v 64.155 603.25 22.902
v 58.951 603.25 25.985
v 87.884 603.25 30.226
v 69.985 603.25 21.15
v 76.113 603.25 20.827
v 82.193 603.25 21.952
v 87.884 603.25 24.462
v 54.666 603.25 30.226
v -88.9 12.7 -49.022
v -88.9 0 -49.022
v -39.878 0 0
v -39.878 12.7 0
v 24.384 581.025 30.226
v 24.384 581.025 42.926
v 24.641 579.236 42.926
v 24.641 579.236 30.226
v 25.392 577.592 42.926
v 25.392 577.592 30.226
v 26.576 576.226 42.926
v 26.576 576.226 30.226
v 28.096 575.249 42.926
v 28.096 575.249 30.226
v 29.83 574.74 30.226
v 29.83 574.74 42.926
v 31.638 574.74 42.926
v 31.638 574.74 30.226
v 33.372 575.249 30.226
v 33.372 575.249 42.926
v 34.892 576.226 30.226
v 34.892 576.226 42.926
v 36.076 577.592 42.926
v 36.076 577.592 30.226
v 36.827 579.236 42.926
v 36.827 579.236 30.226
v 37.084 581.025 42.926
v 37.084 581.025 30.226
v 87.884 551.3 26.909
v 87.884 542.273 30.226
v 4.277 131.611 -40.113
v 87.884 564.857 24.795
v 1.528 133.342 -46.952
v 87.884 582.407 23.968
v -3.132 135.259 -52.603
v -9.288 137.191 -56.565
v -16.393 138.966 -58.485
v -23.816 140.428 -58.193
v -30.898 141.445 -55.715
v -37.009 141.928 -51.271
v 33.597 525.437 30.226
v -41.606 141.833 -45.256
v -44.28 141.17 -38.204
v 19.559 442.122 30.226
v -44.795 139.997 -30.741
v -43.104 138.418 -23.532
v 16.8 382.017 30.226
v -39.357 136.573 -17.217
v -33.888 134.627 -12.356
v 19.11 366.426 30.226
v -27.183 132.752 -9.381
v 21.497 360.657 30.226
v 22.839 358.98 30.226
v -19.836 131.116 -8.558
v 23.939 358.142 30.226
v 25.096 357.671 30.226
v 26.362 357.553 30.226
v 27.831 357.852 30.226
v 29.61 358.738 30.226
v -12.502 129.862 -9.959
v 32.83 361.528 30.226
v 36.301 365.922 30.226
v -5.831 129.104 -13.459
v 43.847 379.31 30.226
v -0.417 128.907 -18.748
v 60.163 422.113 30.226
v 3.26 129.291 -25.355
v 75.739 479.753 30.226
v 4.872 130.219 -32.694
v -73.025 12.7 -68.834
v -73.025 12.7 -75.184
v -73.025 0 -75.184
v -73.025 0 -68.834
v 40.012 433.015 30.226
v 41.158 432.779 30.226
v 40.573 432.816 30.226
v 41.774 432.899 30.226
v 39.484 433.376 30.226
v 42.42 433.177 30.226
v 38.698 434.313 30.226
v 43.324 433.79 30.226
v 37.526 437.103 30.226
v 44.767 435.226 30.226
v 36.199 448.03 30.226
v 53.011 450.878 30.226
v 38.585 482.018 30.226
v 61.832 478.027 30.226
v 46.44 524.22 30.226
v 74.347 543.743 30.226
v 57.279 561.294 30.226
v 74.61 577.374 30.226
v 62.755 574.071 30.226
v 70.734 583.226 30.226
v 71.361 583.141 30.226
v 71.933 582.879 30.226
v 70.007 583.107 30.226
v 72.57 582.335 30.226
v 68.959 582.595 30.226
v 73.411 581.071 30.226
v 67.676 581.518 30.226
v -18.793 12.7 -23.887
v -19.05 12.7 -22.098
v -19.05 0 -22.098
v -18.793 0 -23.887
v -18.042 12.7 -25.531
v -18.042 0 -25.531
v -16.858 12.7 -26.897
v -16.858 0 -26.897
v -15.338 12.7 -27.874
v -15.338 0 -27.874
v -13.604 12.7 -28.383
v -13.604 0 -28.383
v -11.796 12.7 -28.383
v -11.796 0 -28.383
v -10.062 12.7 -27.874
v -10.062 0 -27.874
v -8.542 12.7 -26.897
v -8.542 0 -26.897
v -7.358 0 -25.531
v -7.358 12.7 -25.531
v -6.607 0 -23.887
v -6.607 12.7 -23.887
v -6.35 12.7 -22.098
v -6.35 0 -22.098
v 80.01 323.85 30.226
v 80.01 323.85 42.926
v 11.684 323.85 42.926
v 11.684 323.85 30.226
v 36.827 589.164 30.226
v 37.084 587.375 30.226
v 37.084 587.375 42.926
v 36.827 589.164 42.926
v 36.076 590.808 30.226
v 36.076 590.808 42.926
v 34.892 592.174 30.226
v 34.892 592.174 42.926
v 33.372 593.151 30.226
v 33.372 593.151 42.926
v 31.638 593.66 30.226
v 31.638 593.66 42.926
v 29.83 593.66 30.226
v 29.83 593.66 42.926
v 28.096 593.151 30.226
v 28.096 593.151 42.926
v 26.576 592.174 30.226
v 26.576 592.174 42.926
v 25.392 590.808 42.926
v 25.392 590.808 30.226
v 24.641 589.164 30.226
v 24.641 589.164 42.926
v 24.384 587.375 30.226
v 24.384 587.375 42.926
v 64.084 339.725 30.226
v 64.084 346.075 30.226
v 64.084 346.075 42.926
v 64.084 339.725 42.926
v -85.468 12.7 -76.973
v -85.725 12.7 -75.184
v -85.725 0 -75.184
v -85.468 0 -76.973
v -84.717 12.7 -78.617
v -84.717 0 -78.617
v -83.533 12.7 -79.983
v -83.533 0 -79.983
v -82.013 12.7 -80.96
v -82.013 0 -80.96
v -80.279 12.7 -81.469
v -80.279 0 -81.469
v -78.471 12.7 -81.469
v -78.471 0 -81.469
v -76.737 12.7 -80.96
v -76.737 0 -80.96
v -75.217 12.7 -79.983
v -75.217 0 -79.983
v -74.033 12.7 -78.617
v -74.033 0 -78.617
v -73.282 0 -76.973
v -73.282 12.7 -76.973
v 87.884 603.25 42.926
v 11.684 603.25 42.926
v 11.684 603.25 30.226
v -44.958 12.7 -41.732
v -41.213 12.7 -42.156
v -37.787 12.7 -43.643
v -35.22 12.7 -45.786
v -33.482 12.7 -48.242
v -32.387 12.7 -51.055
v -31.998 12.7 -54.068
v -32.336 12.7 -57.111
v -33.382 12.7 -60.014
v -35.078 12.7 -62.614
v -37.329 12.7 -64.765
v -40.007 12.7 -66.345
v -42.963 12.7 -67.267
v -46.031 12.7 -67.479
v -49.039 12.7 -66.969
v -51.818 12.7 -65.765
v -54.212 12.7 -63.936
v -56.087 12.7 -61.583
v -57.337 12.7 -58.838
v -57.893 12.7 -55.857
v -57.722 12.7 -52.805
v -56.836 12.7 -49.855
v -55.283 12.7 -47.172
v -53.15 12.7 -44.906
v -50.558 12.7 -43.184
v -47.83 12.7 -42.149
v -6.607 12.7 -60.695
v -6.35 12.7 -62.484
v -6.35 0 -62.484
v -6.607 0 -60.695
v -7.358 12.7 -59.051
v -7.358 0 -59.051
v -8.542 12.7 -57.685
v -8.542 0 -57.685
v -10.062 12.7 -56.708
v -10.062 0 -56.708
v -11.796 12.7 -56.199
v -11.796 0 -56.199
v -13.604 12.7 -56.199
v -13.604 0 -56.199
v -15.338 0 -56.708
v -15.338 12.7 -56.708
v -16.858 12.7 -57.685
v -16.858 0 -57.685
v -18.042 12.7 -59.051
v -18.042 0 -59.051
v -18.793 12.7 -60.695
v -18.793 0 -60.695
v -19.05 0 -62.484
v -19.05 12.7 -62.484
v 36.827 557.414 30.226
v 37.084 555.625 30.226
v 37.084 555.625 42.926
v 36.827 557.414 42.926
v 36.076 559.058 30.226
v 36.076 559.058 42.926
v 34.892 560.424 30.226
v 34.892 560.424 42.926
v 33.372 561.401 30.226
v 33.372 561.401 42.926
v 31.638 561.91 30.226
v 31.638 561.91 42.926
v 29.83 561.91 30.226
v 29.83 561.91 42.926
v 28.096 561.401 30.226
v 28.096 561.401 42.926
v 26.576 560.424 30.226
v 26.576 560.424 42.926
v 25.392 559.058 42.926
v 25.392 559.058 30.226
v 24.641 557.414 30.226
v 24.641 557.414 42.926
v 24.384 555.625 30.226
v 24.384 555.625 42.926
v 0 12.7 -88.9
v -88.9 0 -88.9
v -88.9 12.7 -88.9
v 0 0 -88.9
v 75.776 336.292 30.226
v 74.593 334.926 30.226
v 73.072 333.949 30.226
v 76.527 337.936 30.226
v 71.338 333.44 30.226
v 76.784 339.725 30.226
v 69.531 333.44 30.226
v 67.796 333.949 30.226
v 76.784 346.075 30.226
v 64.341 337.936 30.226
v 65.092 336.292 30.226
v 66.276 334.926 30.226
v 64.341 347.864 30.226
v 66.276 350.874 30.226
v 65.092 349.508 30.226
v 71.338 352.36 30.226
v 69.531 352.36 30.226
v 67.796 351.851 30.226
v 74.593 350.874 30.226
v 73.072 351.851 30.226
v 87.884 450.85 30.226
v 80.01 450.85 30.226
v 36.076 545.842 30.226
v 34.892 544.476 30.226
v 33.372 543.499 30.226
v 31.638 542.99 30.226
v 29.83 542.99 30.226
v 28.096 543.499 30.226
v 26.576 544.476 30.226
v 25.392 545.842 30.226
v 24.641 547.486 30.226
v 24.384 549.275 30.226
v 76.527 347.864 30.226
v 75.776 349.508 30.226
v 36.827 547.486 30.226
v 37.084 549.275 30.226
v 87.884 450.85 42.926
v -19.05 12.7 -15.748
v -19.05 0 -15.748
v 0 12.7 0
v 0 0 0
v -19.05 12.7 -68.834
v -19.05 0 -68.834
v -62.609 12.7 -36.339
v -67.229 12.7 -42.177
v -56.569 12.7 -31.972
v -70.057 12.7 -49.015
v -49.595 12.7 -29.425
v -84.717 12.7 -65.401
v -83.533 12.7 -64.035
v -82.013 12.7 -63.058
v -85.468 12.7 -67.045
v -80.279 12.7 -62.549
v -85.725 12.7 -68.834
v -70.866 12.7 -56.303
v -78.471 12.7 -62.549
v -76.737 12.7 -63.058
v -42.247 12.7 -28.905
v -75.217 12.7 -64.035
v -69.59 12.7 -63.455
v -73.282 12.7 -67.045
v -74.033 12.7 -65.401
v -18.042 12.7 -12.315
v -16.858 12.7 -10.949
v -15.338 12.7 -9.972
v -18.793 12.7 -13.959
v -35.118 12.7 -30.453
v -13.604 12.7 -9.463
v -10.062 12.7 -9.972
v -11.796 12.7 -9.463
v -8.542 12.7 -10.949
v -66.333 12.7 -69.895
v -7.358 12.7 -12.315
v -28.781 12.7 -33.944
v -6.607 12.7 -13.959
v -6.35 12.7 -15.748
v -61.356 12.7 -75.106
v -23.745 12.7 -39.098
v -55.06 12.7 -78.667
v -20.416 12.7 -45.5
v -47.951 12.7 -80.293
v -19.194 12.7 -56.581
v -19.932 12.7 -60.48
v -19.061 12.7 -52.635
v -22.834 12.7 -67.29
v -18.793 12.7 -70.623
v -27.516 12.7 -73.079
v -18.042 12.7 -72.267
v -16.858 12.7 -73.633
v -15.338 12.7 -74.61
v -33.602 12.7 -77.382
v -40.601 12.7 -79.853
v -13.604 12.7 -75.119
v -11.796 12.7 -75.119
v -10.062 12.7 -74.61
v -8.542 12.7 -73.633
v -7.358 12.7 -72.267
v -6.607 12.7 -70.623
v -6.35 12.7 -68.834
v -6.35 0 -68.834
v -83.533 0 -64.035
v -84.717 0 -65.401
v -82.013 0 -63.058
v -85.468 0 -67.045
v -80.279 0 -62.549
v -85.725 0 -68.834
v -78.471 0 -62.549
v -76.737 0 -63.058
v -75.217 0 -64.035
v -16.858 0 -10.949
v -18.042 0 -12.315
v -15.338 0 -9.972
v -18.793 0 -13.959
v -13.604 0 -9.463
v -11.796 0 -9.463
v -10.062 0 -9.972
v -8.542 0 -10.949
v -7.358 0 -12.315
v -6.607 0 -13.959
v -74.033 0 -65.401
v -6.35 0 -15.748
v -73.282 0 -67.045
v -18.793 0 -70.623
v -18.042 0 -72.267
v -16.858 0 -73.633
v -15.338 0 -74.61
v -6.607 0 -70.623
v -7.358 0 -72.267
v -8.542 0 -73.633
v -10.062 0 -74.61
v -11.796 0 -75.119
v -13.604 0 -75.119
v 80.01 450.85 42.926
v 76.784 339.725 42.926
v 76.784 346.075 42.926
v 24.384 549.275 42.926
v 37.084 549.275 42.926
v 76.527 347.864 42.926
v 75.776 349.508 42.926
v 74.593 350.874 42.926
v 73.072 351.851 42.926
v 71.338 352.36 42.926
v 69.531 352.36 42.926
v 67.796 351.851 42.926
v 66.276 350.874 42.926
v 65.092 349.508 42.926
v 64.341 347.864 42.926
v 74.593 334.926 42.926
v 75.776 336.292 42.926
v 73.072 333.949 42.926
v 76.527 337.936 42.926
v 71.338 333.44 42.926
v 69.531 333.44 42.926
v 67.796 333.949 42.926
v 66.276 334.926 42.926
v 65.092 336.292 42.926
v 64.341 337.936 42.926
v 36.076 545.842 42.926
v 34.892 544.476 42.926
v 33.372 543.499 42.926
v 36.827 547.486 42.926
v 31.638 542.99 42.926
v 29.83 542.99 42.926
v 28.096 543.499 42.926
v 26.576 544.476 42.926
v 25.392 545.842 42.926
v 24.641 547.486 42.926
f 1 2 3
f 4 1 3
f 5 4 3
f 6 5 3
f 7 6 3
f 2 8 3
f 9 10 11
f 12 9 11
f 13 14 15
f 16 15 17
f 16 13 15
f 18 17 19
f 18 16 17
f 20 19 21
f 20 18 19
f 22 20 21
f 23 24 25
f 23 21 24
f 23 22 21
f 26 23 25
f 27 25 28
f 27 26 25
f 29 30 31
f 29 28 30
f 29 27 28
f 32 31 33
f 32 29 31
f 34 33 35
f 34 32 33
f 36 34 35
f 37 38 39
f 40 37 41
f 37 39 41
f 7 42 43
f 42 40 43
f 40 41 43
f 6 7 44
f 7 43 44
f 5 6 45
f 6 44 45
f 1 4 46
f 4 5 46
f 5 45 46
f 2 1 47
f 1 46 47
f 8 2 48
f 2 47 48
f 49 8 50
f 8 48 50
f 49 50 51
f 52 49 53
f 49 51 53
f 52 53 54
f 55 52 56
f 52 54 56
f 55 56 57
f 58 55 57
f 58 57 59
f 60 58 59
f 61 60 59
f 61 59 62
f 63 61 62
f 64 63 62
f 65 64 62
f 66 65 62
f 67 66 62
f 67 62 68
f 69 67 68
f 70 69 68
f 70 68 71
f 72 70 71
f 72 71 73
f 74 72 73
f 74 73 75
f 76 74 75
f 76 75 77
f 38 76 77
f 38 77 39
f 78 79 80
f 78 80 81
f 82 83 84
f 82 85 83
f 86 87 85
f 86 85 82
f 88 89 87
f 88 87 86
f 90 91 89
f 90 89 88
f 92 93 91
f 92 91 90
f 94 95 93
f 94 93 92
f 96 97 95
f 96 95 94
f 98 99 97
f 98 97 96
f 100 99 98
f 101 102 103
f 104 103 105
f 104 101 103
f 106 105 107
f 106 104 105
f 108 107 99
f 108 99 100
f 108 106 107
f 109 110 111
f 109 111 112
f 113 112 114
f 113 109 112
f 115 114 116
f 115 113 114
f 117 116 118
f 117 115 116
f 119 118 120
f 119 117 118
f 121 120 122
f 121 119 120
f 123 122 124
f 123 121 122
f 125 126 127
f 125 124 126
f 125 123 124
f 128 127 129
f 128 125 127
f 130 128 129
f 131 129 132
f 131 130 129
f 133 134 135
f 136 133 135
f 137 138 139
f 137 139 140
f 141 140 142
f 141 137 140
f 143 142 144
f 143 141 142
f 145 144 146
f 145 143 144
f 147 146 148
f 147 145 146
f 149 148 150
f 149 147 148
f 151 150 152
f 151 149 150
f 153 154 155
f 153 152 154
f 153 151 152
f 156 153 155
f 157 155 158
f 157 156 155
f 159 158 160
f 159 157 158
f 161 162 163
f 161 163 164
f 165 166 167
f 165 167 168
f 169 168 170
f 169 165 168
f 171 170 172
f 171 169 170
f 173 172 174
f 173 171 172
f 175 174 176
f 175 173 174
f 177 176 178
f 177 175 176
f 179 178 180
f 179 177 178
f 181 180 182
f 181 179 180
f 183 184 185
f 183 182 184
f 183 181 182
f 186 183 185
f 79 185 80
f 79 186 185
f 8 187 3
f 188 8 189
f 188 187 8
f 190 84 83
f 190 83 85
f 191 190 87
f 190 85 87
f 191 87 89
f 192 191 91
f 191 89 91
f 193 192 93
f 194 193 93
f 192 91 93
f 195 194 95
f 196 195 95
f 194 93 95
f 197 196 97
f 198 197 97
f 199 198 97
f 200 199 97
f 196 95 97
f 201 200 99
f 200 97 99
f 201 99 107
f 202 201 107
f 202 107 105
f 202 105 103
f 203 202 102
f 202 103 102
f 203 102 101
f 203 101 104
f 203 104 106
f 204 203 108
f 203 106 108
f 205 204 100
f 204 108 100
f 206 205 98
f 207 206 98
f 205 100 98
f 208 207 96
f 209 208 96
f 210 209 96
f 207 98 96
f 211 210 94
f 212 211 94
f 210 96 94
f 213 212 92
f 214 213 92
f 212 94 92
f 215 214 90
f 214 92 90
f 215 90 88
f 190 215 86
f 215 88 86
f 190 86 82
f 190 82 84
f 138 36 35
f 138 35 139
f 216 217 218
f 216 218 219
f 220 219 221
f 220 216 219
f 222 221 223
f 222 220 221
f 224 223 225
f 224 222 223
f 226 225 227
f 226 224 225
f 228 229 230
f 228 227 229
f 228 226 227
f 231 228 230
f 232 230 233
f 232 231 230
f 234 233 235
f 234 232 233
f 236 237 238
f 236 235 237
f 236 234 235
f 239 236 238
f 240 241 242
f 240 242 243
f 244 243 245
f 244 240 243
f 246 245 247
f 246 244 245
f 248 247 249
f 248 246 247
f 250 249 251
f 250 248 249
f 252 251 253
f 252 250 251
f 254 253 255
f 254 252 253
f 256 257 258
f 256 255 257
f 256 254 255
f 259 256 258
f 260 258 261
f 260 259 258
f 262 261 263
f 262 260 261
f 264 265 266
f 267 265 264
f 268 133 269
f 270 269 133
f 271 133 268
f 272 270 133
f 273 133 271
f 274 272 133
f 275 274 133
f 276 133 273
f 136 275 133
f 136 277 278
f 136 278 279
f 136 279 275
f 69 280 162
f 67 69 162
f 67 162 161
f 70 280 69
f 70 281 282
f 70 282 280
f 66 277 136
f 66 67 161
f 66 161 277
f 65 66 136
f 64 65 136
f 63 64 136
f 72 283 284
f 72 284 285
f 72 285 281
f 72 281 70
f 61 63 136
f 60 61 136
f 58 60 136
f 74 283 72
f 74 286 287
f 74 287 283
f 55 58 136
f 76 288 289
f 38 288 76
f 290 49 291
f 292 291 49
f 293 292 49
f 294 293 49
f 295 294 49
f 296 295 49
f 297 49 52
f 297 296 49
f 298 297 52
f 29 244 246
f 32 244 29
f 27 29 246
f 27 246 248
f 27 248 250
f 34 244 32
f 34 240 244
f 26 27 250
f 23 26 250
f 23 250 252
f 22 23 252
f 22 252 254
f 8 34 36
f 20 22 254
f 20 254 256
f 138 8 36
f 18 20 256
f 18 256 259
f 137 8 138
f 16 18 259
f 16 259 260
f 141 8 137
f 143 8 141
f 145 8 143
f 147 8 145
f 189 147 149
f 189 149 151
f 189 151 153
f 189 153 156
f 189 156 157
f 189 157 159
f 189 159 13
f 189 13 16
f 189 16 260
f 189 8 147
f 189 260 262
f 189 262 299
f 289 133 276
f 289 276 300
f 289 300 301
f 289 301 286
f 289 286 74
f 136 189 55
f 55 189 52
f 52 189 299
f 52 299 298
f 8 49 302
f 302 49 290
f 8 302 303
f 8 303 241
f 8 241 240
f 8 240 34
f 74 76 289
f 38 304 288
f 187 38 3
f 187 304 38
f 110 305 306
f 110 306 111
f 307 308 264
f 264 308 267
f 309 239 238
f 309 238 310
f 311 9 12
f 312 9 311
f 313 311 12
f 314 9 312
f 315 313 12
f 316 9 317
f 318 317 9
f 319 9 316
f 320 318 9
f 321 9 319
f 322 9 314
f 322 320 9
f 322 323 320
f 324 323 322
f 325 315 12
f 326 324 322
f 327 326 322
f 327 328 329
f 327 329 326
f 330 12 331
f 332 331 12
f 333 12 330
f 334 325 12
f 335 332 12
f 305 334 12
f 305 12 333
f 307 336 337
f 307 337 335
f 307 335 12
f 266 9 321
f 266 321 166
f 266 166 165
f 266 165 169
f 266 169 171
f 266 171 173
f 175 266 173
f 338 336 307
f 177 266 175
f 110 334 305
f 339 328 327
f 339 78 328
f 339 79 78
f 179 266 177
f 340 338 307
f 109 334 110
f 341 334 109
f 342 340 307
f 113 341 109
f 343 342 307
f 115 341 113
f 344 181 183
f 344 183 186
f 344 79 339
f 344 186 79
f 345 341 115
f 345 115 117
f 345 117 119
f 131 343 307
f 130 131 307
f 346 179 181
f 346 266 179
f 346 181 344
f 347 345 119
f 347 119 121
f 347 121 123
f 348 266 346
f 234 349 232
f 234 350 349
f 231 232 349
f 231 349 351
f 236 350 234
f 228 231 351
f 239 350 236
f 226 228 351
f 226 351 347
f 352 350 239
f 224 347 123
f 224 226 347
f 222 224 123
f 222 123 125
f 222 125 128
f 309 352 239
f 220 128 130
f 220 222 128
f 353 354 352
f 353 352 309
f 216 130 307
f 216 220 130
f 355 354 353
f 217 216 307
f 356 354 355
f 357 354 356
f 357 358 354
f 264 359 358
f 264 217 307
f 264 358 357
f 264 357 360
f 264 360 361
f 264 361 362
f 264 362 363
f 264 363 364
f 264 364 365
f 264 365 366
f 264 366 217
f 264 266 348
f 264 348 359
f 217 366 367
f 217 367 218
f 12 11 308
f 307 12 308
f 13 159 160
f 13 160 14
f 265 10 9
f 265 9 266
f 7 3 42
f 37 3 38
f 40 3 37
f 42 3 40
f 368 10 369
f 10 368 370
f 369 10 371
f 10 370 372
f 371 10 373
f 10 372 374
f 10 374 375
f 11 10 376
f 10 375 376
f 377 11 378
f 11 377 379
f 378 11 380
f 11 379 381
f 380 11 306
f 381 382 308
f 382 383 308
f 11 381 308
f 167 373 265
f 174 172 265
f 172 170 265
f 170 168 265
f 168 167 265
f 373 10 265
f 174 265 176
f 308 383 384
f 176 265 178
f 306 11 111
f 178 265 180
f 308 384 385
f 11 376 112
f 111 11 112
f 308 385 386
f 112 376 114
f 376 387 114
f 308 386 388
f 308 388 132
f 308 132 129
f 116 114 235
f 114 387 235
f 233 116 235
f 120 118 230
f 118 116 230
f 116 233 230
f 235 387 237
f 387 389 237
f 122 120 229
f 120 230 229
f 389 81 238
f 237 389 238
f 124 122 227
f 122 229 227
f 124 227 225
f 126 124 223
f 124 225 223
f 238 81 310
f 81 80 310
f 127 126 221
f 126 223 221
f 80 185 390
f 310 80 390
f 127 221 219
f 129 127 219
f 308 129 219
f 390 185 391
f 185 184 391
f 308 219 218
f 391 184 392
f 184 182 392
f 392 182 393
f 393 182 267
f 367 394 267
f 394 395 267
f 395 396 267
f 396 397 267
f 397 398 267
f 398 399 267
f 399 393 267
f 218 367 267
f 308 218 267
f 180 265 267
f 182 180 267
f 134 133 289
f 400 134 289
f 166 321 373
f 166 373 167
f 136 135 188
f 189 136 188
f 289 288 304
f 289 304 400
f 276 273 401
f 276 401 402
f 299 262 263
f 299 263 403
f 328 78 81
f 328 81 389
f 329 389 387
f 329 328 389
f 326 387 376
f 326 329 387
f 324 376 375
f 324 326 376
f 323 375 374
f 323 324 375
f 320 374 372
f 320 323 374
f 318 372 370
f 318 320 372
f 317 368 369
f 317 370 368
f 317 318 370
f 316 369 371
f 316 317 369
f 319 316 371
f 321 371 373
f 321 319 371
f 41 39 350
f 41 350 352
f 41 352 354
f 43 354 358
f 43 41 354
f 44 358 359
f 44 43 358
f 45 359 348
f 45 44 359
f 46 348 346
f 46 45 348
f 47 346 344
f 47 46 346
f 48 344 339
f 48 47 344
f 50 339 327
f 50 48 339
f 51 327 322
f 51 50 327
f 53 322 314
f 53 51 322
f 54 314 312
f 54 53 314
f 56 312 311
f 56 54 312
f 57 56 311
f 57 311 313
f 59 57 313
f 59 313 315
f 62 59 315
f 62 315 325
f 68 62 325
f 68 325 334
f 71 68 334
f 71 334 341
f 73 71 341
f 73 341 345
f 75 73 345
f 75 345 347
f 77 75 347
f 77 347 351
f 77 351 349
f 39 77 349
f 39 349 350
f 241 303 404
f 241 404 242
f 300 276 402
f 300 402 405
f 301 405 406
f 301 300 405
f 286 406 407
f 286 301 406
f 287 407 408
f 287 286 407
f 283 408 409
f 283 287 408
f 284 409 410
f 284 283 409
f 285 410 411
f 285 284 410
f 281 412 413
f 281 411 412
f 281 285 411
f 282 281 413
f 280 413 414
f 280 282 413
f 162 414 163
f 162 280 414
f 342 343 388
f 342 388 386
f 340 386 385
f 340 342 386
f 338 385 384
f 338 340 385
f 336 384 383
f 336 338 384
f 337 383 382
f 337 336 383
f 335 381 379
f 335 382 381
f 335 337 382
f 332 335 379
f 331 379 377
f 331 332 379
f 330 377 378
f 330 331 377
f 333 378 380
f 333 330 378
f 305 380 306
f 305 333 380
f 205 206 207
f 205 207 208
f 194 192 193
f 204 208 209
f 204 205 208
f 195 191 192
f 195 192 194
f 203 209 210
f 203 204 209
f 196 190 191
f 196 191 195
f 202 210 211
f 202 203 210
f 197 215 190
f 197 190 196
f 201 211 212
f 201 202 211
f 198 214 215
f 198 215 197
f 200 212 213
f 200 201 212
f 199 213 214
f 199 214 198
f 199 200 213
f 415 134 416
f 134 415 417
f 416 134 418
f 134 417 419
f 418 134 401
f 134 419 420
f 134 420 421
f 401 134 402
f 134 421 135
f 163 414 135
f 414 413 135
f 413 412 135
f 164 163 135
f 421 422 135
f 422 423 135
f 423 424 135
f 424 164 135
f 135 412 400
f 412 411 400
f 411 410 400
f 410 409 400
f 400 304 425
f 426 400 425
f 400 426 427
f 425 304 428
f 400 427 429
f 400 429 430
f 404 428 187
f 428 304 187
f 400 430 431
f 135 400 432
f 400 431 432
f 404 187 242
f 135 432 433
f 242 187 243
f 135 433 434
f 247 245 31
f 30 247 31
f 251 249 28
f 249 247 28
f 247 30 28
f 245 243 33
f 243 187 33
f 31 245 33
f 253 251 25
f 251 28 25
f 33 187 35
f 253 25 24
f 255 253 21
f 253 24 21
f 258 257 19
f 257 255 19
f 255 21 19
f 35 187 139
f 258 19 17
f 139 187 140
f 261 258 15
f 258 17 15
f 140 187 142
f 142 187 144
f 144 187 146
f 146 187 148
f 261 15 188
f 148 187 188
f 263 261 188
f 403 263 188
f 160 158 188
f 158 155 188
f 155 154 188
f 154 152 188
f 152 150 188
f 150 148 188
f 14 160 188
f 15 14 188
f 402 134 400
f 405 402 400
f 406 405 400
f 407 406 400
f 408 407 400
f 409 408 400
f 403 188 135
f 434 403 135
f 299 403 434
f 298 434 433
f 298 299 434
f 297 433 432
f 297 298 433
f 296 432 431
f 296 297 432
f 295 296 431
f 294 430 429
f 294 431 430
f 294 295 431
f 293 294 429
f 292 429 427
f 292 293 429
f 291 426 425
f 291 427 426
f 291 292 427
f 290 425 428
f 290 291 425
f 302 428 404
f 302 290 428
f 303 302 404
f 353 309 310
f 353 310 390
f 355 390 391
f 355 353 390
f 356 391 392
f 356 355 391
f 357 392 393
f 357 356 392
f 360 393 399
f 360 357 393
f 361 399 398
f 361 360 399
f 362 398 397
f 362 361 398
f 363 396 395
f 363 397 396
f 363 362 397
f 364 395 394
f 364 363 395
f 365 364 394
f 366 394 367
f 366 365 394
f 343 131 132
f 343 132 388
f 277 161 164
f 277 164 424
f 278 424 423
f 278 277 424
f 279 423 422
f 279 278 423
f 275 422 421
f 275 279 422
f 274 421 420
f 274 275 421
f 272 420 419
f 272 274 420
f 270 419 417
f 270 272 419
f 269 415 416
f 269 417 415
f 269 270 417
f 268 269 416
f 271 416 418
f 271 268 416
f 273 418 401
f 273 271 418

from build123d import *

# Parameters (mm, degrees)
SKETCH1_W                  = 88.9
SKETCH1_H                  = 88.9
EXTRUDE1_DEPTH             = 12.7
EXTRUDE2_DEPTH             = 127.363404513
EXTRUDE9_DEPTH             = 127.363404513
SKETCH4_W                  = 76.2
SKETCH4_H                  = 279.4
EXTRUDE3_DEPTH             = 12.7
EXTRUDE7_DEPTH             = 622.292826593
EXTRUDE6_REACH             = 742.115
EXTRUDE6_START             = 127
SKETCH7_R                  = 25.4
SKETCH7_R_2                = 12.7
EXTRUDE6_DIRECTION_2_REACH = 742.115
EXTRUDE10_DEPTH            = 676.899389977
SKETCH9_W                  = 7.874
SKETCH9_H                  = 127
EXTRUDE8_DEPTH             = 622.292826593


with BuildPart() as part:
    # Sketch1 → Extrude1 (new body)
    with BuildSketch(Plane(origin=(0, 0, 0), x_dir=(1, 0, 0), z_dir=(0, 1, 0))):
        with Locations((-44.45, 44.45)):
            Rectangle(SKETCH1_W, SKETCH1_H)
    extrude(amount=EXTRUDE1_DEPTH)

    # Sketch2 → Extrude2 (cut, through all)
    with BuildSketch(Plane(origin=(0, 12.7, 0), x_dir=(1, 0, 0), z_dir=(0, 1, 0))):
        with BuildLine():
            Line((-19.05, 15.748), (-19.05, 22.098))
            ThreePointArc((-19.05, 22.098), (-12.7, 28.448), (-6.35, 22.098))
            Line((-6.35, 22.098), (-6.35, 15.748))
            ThreePointArc((-6.35, 15.748), (-12.7, 9.398), (-19.05, 15.748))
        make_face()
        with BuildLine():
            Line((-19.05, 62.484), (-19.05, 68.834))
            ThreePointArc((-19.05, 68.834), (-12.7, 75.184), (-6.35, 68.834))
            Line((-6.35, 68.834), (-6.35, 62.484))
            ThreePointArc((-6.35, 62.484), (-12.7, 56.134), (-19.05, 62.484))
        make_face()
        with BuildLine():
            Line((-85.725, 68.834), (-85.725, 75.184))
            ThreePointArc((-85.725, 75.184), (-79.375, 81.534), (-73.025, 75.184))
            Line((-73.025, 75.184), (-73.025, 68.834))
            ThreePointArc((-73.025, 68.834), (-79.375, 62.484), (-85.725, 68.834))
        make_face()
    extrude(amount=-EXTRUDE2_DEPTH, mode=Mode.SUBTRACT)

    # Sketch10 → Extrude9 (cut, through all)
    with BuildSketch(Plane.XZ):
        Polygon((-88.9, -49.022), (-39.878, 0), (-88.9, 0), align=None)
    extrude(amount=-EXTRUDE9_DEPTH, mode=Mode.SUBTRACT)



with BuildPart() as body_2:
    # Sketch4 → Extrude3 (new body)
    with BuildSketch(Plane(origin=(0, 0, 42.926), x_dir=(-1, 0, 0), z_dir=(0, 0, -1))):
        with Locations((-49.784, 463.55)):
            Rectangle(SKETCH4_W, SKETCH4_H)
    extrude(amount=EXTRUDE3_DEPTH)

    # Sketch8 → Extrude7 (cut, through all)
    with BuildSketch(Plane(origin=(0, 0, 30.226), x_dir=(-1, 0, 0), z_dir=(0, 0, -1))):
        with BuildLine():
            Line((-24.384, 587.375), (-24.384, 581.025))
            ThreePointArc((-24.384, 581.025), (-30.734, 574.675), (-37.084, 581.025))
            Line((-37.084, 581.025), (-37.084, 587.375))
            ThreePointArc((-37.084, 587.375), (-30.734, 593.725), (-24.384, 587.375))
        make_face()
        with BuildLine():
            Line((-24.384, 555.625), (-24.384, 549.275))
            ThreePointArc((-24.384, 549.275), (-30.734, 542.925), (-37.084, 549.275))
            Line((-37.084, 549.275), (-37.084, 555.625))
            ThreePointArc((-37.084, 555.625), (-30.734, 561.975), (-24.384, 555.625))
        make_face()
        with BuildLine():
            Line((-64.0842, 346.075), (-64.0842, 339.725))
            ThreePointArc((-64.0842, 339.725), (-70.4342, 333.375), (-76.7842, 339.725))
            Line((-76.7842, 339.725), (-76.7842, 346.075))
            ThreePointArc((-76.7842, 346.075), (-70.4342, 352.425), (-64.0842, 346.075))
        make_face()
    extrude(amount=-EXTRUDE7_DEPTH, mode=Mode.SUBTRACT)


with BuildPart() as part_1:
    add(part.part)

    add(body_2.part)  # Extrude6 merges body 2
    # Extrude6: up to this plane
    extrude6_end = Plane(origin=(11.684, 323.85, 30.226), z_dir=(0, 0, 1))
    # Sketch7 → Extrude6 (add, up to the surface)
    with BuildSketch(Plane(origin=(-44.958, 12.7, -54.61), x_dir=(-0.9783852357673664, 0.18254912655536365, 0.09715012519965675), z_dir=(0.1967453547942853, 0.9663814656142476, 0.16552379975136336)).offset(EXTRUDE6_START), mode=Mode.PRIVATE) as extrude6_sk1:
        with Locations(Location((0, 0, 0), (0, 0, 189.444307403))):
            Circle(SKETCH7_R)
        with Locations(Location((0, 0, 0), (0, 0, 84.346682726))):
            Circle(SKETCH7_R_2, mode=Mode.SUBTRACT)
    extrude6_tool1 = split(extrude(extrude6_sk1.sketch, amount=EXTRUDE6_REACH, mode=Mode.PRIVATE), bisect_by=extrude6_end, keep=Keep.BOTH, mode=Mode.PRIVATE)
    add(extrude6_tool1.solids().sort_by_distance((-43.534266, 139.141689, -27.248481))[0])

    # Extrude6 direction 2: up to this plane
    extrude6_direction_2_end = Plane(origin=(0, 12.7, -88.9), z_dir=(0, 1, 0))
    # Sketch7 → Extrude6 direction 2 (add, up to the surface)
    with BuildSketch(Plane(origin=(-44.958, 12.7, -54.61), x_dir=(-0.9783852357673664, 0.18254912655536365, 0.09715012519965675), z_dir=(0.1967453547942853, 0.9663814656142476, 0.16552379975136336)).offset(EXTRUDE6_START), mode=Mode.PRIVATE) as extrude6_direction_2_sk1:
        with Locations(Location((0, 0, 0), (0, 0, 189.444307403))):
            Circle(SKETCH7_R)
        with Locations(Location((0, 0, 0), (0, 0, 84.346682726))):
            Circle(SKETCH7_R_2, mode=Mode.SUBTRACT)
    extrude6_direction_2_tool1 = split(extrude(extrude6_direction_2_sk1.sketch, amount=-EXTRUDE6_DIRECTION_2_REACH, mode=Mode.PRIVATE), bisect_by=extrude6_direction_2_end, keep=Keep.BOTH, mode=Mode.PRIVATE)
    add(extrude6_direction_2_tool1.solids().sort_by_distance((-43.534266, 139.141689, -27.248481))[0])

    # Sketch11 → Extrude10 (cut, through all)
    with BuildSketch(Plane.XY.offset(30.226)):
        with BuildLine():
            Line((54.665648122, 603.25), (87.884, 603.25))
            Line((87.884, 603.25), (87.884, 542.273095972))
            add(Edge.make_bspline(
                [(87.884, 542.273095972), (134.728854914, 839.694203258), (54.665648122, 603.25)],
                knots=[1.834299587, 1.834299587, 1.834299587, 4.060538938, 4.060538938, 4.060538938], degree=2, weights=[1, 0.441865068, 1]))
        make_face()
    extrude(amount=-EXTRUDE10_DEPTH, mode=Mode.SUBTRACT)

    # Sketch9 → Extrude8 (cut, through all)
    with BuildSketch(Plane(origin=(0, 0, 30.226), x_dir=(-1, 0, 0), z_dir=(0, 0, -1))):
        with Locations((-83.947, 387.35)):
            Rectangle(SKETCH9_W, SKETCH9_H)
    extrude(amount=-EXTRUDE8_DEPTH, mode=Mode.SUBTRACT)


solid = part_1.part
